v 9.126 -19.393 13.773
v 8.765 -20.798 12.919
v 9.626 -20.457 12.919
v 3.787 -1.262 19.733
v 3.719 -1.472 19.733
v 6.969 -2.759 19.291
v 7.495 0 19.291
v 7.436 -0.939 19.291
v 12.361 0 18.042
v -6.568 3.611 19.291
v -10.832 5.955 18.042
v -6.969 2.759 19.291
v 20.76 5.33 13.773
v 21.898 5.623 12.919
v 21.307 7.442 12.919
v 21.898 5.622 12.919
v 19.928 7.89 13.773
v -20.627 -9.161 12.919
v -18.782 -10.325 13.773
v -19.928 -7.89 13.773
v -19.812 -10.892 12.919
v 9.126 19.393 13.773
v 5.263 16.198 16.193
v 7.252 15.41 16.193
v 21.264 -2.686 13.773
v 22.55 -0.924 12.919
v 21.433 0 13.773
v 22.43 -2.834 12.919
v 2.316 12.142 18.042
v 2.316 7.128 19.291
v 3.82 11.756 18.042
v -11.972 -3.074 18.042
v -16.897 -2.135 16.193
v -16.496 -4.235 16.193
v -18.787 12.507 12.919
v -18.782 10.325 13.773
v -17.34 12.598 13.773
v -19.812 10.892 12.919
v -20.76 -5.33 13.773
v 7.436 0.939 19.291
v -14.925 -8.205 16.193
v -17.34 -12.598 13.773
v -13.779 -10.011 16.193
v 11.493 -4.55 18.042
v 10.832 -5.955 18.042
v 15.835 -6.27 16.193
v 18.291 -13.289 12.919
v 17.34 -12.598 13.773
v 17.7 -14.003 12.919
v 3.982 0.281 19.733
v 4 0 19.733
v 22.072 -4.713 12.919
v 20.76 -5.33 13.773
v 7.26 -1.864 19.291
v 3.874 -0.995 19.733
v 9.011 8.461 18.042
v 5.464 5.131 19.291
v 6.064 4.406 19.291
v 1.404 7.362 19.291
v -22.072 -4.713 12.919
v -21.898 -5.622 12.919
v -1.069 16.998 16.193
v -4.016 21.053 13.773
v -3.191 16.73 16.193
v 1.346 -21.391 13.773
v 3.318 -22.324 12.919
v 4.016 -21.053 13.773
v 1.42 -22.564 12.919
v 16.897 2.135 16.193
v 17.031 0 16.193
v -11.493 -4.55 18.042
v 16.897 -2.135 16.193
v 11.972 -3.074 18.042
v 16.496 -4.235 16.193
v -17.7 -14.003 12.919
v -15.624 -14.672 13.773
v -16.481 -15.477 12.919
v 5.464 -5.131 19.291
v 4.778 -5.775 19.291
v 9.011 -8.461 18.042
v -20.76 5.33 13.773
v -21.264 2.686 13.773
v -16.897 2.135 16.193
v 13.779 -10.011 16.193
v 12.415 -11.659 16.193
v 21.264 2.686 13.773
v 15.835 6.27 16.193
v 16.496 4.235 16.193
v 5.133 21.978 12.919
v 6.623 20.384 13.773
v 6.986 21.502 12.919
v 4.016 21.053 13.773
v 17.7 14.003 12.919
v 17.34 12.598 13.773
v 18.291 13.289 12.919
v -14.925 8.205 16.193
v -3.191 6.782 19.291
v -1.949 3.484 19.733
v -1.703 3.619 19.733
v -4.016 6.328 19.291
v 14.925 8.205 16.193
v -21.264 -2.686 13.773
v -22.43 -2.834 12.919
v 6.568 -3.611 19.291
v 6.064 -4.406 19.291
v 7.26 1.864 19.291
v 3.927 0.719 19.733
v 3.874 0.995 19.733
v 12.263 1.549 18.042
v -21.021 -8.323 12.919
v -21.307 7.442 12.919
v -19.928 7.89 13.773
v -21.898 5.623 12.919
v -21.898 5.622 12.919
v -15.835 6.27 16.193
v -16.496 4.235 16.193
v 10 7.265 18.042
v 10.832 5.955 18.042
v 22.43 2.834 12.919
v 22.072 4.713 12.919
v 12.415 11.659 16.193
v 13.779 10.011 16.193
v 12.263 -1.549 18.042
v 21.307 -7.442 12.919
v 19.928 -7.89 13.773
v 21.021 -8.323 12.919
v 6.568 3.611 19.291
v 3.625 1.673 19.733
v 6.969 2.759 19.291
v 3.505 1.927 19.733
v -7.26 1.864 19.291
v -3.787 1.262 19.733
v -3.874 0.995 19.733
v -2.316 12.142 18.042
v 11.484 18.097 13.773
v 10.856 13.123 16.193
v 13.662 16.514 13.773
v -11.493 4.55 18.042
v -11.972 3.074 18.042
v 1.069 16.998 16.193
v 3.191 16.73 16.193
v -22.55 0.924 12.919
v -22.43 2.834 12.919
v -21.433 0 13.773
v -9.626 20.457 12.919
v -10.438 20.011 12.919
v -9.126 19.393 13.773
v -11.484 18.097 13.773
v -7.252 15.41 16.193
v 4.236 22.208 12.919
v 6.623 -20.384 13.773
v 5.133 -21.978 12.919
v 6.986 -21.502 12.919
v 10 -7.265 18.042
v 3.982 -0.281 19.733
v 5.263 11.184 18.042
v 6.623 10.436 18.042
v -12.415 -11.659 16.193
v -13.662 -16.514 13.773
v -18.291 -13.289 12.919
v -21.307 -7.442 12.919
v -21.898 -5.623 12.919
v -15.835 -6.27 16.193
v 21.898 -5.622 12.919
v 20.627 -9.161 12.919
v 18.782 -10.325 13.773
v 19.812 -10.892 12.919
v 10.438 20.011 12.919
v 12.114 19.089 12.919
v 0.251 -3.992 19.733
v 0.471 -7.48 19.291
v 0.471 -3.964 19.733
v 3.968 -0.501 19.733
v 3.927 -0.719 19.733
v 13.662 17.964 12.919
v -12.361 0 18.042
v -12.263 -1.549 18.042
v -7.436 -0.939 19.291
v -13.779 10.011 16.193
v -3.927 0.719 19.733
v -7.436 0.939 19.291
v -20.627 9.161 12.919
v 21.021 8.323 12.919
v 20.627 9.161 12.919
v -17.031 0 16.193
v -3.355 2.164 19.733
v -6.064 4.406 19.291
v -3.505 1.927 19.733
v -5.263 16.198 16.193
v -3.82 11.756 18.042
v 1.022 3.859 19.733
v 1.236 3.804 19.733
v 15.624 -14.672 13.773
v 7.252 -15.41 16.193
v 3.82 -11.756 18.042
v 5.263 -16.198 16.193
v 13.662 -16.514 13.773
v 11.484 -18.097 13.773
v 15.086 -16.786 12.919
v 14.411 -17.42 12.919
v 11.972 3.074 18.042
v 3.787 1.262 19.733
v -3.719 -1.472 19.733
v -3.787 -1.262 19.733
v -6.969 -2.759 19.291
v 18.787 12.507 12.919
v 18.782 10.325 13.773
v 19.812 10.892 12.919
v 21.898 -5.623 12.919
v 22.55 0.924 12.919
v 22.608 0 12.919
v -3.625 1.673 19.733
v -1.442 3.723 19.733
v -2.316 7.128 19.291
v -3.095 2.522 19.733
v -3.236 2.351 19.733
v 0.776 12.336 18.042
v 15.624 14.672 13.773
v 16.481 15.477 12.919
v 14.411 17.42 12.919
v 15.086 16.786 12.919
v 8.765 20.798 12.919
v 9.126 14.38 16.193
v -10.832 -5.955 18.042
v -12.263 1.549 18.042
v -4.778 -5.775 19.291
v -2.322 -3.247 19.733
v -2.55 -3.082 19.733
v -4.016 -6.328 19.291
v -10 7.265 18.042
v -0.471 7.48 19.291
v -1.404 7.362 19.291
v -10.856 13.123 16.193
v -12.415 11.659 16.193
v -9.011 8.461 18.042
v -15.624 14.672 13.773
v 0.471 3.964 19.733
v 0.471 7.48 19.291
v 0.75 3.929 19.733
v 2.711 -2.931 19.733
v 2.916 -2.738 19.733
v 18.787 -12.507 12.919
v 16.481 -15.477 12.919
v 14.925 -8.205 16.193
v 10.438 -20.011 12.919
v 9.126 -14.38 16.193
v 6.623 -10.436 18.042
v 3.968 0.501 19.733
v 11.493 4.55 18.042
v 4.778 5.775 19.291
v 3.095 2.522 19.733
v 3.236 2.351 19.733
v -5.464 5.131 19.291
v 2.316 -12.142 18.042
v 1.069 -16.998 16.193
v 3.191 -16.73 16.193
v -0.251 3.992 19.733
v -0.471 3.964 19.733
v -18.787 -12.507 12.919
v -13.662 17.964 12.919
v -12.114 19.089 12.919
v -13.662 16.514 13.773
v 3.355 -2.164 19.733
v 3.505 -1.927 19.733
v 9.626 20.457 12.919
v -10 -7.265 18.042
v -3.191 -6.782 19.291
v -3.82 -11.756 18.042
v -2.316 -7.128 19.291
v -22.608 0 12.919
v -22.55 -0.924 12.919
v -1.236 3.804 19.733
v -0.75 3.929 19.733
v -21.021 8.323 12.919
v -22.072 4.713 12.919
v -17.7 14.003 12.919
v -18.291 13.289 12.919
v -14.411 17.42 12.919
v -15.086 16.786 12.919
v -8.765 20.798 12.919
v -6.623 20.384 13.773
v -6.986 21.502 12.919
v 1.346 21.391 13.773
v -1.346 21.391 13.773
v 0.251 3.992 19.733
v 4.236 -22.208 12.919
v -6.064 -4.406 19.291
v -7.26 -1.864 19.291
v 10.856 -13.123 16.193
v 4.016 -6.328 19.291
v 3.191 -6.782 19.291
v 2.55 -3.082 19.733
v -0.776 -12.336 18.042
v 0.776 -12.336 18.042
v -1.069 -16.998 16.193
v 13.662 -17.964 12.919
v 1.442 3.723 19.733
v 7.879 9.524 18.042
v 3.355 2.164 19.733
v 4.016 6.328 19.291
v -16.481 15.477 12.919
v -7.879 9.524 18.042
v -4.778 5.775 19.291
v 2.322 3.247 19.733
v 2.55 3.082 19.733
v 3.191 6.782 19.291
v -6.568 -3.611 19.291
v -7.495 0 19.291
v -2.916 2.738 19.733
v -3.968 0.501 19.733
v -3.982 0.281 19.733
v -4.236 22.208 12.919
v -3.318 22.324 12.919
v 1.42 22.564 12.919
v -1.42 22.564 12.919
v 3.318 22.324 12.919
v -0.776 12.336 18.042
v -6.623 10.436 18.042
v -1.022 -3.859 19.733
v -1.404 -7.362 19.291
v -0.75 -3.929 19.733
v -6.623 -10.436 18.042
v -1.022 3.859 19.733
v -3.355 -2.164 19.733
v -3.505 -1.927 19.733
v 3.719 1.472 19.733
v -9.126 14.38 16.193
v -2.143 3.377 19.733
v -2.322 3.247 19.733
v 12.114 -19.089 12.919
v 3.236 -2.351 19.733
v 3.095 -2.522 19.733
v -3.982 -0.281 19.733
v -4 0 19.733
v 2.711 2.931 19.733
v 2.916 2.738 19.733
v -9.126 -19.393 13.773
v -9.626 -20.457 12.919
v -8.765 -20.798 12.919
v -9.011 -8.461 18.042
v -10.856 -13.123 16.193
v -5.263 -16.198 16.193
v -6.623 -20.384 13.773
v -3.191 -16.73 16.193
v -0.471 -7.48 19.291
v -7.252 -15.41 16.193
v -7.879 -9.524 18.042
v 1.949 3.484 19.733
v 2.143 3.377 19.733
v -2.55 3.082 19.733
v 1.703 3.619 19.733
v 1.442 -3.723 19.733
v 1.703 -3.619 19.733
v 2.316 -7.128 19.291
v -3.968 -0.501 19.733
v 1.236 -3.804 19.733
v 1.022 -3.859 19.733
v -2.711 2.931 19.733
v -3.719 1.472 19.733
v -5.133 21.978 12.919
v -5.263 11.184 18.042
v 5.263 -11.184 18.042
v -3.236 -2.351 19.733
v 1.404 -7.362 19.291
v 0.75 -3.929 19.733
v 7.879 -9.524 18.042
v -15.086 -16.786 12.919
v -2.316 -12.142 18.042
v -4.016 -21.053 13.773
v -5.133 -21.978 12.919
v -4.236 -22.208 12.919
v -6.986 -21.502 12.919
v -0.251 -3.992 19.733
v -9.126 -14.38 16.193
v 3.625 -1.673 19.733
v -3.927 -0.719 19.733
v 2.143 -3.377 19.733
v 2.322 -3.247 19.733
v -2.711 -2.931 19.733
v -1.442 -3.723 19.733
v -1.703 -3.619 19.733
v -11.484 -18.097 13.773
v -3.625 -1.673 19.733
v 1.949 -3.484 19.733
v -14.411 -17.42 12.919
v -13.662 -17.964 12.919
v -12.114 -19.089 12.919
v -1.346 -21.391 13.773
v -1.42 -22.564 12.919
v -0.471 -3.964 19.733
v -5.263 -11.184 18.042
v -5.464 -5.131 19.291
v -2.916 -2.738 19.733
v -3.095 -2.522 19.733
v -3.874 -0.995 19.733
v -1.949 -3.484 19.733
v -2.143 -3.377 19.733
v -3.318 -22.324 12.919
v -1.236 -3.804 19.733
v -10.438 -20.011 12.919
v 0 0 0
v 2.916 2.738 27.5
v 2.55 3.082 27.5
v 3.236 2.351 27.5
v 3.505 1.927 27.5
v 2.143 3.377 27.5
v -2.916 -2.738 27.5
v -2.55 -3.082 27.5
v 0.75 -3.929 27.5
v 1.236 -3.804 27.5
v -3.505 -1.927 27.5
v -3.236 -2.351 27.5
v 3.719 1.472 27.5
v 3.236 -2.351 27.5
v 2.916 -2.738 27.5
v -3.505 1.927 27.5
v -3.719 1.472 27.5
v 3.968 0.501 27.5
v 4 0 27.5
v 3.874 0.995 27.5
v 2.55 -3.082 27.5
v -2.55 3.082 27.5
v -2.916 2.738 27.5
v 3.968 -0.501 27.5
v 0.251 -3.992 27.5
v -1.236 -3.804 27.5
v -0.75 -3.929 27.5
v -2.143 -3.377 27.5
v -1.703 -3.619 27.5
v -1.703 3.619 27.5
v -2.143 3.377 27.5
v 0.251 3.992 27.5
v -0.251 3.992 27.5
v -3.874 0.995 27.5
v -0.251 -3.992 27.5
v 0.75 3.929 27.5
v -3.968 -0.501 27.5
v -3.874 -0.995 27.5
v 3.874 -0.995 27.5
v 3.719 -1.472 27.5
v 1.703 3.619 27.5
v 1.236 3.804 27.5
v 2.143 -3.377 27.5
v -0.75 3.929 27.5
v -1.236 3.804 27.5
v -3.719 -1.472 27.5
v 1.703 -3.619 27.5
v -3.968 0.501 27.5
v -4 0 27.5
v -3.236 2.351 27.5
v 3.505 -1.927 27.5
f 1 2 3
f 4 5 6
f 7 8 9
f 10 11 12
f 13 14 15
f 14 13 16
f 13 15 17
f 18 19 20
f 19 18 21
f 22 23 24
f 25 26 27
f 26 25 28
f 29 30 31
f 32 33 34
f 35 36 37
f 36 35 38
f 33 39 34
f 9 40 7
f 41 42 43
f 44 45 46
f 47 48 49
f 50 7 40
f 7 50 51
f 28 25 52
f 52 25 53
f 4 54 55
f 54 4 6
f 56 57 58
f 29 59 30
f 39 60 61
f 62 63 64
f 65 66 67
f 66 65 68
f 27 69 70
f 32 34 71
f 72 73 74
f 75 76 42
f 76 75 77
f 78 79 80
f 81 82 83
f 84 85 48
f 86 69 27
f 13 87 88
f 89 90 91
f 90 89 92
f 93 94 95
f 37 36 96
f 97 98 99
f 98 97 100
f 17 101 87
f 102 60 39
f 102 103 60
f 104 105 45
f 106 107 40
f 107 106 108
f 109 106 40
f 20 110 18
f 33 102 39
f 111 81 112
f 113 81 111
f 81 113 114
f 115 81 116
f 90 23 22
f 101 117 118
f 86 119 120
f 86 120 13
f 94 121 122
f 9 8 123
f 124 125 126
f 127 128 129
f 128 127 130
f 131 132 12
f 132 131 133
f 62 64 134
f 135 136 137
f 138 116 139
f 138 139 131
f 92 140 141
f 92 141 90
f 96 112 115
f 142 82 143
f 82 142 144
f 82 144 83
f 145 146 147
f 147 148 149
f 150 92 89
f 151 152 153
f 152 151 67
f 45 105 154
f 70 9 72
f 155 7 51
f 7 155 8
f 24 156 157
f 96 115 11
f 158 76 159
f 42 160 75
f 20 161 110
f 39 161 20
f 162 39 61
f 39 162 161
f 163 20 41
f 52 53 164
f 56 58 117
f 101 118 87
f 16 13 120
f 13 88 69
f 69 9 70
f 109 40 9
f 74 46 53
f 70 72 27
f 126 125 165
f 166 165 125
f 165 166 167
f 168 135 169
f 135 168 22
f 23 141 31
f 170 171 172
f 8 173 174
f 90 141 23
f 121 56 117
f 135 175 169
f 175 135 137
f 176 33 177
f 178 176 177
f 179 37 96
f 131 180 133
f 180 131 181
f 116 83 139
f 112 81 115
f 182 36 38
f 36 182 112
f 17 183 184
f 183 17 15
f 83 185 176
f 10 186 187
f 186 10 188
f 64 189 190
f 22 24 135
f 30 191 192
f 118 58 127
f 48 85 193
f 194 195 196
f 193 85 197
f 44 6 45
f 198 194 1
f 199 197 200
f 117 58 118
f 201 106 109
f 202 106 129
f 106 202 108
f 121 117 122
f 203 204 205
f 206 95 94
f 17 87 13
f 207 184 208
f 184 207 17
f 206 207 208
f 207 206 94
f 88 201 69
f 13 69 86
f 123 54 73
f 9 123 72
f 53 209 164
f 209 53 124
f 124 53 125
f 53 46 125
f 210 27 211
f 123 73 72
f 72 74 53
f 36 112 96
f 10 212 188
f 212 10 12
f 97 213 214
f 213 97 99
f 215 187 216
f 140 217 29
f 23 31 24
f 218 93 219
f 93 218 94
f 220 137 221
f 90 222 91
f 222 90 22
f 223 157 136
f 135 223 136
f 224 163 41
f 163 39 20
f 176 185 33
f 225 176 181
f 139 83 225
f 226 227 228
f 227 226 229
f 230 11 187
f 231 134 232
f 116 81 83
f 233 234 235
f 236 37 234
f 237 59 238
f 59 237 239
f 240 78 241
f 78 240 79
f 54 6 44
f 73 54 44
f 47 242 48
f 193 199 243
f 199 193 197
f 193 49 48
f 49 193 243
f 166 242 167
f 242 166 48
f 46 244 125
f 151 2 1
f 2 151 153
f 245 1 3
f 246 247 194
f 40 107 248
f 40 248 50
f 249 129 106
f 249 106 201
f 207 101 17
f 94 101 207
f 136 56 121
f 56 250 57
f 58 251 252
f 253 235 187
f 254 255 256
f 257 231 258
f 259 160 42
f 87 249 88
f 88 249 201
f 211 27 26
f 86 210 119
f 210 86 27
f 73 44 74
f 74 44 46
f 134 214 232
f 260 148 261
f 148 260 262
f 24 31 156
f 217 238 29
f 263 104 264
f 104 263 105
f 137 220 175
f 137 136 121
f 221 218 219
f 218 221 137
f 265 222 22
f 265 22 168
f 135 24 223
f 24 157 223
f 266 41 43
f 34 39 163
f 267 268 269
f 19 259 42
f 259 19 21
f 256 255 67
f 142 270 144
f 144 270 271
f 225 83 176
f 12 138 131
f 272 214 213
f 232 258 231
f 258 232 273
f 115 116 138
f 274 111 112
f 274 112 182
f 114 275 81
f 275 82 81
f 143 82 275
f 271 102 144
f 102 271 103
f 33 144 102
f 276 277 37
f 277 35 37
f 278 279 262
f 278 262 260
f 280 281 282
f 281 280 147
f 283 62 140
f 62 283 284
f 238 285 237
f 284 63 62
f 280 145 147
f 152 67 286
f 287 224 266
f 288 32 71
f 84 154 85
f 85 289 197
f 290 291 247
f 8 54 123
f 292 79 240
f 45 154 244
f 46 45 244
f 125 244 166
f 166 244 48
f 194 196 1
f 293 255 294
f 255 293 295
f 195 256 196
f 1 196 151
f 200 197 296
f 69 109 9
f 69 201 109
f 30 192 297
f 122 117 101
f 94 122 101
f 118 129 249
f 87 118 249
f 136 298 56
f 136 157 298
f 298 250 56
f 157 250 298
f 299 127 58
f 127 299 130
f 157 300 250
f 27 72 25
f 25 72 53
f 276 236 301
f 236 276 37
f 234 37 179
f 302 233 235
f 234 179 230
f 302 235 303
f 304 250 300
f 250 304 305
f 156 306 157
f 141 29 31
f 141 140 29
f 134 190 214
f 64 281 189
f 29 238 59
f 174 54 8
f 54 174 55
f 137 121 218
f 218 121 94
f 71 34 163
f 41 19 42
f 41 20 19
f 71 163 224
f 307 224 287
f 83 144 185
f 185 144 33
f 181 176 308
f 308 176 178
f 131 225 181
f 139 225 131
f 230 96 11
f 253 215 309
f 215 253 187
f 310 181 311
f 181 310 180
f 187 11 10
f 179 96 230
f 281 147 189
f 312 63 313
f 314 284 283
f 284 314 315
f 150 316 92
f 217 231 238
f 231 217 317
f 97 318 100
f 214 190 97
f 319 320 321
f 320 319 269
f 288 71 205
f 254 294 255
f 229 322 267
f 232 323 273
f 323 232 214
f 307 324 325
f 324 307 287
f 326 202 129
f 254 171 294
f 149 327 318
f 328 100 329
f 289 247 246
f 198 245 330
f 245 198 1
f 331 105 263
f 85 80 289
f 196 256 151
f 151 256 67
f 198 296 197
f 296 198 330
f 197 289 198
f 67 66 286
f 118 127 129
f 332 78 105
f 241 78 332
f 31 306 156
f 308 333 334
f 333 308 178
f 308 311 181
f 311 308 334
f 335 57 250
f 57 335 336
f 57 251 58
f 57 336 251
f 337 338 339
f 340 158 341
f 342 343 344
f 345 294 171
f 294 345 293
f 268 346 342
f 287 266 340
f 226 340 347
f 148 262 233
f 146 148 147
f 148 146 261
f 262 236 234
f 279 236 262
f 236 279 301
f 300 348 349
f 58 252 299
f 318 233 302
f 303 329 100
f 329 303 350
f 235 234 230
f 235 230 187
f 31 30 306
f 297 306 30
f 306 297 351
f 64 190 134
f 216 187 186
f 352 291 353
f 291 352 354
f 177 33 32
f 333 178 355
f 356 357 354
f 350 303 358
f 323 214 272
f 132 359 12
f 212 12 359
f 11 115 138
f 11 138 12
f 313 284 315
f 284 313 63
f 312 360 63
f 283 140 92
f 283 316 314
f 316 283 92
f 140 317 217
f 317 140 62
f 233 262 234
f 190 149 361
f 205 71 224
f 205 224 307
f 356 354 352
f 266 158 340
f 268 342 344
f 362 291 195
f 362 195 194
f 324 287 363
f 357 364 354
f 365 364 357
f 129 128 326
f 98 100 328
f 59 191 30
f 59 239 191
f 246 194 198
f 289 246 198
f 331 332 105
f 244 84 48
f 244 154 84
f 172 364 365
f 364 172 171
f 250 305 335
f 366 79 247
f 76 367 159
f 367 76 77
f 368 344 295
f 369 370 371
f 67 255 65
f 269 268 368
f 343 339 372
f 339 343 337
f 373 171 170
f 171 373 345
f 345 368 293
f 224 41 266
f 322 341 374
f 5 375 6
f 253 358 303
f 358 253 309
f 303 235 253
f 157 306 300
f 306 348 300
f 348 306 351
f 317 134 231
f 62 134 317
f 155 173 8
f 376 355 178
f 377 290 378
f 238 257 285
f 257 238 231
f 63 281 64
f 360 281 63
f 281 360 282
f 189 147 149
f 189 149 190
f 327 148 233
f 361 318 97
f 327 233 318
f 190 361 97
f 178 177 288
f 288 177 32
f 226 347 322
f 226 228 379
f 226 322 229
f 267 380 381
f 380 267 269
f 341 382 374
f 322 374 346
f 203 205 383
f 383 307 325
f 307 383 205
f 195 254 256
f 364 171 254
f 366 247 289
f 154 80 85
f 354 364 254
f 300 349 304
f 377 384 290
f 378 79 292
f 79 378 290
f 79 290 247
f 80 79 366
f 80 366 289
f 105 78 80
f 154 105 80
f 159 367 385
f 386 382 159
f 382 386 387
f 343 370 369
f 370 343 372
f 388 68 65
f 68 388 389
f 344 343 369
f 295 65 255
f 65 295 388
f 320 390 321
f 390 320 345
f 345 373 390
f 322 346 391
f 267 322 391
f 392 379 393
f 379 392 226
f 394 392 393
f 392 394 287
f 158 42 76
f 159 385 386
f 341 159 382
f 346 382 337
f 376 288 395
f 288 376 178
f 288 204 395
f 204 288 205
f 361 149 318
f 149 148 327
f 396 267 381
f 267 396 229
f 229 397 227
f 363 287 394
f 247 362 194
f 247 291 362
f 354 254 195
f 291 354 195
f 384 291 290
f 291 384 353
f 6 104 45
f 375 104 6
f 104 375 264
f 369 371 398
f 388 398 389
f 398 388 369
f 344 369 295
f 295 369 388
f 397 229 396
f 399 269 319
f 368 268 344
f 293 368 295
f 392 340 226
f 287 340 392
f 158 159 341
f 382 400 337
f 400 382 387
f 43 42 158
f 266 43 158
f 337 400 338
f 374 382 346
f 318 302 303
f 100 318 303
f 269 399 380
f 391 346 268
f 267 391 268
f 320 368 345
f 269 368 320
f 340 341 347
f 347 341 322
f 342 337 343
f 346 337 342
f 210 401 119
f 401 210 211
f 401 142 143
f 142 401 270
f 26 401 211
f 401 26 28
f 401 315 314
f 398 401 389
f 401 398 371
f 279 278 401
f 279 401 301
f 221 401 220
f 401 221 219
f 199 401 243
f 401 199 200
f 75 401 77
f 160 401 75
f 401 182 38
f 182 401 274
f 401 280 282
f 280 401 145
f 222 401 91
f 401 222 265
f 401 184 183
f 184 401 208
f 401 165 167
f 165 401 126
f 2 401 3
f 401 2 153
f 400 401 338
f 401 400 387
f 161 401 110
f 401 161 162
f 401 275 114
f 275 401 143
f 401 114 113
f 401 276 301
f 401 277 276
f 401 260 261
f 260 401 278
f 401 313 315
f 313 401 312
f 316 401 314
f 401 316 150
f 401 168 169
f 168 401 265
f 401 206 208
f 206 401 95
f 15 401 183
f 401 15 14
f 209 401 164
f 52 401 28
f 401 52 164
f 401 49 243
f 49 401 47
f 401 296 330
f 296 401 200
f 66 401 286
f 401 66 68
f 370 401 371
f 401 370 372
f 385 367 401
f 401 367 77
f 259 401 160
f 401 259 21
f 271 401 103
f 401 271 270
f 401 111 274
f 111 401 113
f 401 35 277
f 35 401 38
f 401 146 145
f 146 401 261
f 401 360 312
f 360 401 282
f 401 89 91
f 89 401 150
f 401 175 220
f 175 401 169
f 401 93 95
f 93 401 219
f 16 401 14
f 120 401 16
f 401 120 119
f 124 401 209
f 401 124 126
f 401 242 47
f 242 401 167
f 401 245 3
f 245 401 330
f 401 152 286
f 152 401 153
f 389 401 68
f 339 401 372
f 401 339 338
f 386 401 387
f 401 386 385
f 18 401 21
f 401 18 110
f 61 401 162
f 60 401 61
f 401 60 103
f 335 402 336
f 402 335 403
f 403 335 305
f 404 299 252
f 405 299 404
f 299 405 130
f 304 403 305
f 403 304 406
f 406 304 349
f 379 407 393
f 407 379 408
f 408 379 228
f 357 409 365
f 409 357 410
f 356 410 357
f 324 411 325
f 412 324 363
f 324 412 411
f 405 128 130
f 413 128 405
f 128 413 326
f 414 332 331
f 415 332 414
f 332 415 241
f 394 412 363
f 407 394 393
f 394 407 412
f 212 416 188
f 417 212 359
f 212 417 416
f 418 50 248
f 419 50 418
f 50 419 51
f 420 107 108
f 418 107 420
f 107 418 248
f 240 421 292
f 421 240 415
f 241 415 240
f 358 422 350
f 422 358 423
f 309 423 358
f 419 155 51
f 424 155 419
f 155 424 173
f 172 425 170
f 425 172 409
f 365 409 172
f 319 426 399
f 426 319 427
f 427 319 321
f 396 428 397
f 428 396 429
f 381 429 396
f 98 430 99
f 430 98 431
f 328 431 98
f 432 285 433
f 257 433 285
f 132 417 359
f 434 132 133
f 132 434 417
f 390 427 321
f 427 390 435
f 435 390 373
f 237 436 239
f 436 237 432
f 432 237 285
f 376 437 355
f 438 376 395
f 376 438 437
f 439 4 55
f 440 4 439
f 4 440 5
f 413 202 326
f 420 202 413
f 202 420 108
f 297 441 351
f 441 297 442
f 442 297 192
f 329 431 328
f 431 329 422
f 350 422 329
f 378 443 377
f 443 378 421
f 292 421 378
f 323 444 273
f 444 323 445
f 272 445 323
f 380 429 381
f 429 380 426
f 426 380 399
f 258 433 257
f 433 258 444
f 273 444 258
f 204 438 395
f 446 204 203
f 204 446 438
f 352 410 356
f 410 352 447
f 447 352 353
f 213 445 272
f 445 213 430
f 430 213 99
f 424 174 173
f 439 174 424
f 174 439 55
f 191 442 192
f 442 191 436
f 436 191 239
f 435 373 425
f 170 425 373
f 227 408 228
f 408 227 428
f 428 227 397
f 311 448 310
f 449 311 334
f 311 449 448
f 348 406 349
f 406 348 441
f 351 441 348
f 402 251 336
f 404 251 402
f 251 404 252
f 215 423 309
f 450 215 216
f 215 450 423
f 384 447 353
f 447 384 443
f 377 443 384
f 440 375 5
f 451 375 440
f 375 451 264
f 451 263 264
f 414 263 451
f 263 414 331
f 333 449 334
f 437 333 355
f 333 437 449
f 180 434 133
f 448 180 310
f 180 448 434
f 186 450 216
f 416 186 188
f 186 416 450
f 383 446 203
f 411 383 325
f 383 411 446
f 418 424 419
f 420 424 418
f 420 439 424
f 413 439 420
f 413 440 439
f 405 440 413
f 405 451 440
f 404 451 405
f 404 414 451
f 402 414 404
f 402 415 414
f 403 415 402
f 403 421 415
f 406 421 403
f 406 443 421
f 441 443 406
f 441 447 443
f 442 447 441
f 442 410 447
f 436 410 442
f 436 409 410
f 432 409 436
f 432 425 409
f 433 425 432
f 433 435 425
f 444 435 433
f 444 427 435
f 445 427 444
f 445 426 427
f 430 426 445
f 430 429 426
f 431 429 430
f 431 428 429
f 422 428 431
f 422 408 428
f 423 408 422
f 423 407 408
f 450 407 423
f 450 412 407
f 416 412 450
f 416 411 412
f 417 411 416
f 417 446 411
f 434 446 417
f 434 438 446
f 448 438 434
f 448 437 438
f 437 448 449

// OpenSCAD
faces = 50;
radius = 40;
rho = 70;
handle_radius = 4;
handle_height = 15;

union() {
    intersection() {
        translate([0, 0, -radius / 2])
            sphere(r=radius, $fn=faces);
        cylinder(h=radius, r1=0, r2=rho, $fn=faces);
    }
    translate([0, 0, radius / 2 - handle_height / 2])
        cylinder(
            h=handle_height, 
            r1=handle_radius, 
            r2=handle_radius, 
            $fn=faces
        );
}
